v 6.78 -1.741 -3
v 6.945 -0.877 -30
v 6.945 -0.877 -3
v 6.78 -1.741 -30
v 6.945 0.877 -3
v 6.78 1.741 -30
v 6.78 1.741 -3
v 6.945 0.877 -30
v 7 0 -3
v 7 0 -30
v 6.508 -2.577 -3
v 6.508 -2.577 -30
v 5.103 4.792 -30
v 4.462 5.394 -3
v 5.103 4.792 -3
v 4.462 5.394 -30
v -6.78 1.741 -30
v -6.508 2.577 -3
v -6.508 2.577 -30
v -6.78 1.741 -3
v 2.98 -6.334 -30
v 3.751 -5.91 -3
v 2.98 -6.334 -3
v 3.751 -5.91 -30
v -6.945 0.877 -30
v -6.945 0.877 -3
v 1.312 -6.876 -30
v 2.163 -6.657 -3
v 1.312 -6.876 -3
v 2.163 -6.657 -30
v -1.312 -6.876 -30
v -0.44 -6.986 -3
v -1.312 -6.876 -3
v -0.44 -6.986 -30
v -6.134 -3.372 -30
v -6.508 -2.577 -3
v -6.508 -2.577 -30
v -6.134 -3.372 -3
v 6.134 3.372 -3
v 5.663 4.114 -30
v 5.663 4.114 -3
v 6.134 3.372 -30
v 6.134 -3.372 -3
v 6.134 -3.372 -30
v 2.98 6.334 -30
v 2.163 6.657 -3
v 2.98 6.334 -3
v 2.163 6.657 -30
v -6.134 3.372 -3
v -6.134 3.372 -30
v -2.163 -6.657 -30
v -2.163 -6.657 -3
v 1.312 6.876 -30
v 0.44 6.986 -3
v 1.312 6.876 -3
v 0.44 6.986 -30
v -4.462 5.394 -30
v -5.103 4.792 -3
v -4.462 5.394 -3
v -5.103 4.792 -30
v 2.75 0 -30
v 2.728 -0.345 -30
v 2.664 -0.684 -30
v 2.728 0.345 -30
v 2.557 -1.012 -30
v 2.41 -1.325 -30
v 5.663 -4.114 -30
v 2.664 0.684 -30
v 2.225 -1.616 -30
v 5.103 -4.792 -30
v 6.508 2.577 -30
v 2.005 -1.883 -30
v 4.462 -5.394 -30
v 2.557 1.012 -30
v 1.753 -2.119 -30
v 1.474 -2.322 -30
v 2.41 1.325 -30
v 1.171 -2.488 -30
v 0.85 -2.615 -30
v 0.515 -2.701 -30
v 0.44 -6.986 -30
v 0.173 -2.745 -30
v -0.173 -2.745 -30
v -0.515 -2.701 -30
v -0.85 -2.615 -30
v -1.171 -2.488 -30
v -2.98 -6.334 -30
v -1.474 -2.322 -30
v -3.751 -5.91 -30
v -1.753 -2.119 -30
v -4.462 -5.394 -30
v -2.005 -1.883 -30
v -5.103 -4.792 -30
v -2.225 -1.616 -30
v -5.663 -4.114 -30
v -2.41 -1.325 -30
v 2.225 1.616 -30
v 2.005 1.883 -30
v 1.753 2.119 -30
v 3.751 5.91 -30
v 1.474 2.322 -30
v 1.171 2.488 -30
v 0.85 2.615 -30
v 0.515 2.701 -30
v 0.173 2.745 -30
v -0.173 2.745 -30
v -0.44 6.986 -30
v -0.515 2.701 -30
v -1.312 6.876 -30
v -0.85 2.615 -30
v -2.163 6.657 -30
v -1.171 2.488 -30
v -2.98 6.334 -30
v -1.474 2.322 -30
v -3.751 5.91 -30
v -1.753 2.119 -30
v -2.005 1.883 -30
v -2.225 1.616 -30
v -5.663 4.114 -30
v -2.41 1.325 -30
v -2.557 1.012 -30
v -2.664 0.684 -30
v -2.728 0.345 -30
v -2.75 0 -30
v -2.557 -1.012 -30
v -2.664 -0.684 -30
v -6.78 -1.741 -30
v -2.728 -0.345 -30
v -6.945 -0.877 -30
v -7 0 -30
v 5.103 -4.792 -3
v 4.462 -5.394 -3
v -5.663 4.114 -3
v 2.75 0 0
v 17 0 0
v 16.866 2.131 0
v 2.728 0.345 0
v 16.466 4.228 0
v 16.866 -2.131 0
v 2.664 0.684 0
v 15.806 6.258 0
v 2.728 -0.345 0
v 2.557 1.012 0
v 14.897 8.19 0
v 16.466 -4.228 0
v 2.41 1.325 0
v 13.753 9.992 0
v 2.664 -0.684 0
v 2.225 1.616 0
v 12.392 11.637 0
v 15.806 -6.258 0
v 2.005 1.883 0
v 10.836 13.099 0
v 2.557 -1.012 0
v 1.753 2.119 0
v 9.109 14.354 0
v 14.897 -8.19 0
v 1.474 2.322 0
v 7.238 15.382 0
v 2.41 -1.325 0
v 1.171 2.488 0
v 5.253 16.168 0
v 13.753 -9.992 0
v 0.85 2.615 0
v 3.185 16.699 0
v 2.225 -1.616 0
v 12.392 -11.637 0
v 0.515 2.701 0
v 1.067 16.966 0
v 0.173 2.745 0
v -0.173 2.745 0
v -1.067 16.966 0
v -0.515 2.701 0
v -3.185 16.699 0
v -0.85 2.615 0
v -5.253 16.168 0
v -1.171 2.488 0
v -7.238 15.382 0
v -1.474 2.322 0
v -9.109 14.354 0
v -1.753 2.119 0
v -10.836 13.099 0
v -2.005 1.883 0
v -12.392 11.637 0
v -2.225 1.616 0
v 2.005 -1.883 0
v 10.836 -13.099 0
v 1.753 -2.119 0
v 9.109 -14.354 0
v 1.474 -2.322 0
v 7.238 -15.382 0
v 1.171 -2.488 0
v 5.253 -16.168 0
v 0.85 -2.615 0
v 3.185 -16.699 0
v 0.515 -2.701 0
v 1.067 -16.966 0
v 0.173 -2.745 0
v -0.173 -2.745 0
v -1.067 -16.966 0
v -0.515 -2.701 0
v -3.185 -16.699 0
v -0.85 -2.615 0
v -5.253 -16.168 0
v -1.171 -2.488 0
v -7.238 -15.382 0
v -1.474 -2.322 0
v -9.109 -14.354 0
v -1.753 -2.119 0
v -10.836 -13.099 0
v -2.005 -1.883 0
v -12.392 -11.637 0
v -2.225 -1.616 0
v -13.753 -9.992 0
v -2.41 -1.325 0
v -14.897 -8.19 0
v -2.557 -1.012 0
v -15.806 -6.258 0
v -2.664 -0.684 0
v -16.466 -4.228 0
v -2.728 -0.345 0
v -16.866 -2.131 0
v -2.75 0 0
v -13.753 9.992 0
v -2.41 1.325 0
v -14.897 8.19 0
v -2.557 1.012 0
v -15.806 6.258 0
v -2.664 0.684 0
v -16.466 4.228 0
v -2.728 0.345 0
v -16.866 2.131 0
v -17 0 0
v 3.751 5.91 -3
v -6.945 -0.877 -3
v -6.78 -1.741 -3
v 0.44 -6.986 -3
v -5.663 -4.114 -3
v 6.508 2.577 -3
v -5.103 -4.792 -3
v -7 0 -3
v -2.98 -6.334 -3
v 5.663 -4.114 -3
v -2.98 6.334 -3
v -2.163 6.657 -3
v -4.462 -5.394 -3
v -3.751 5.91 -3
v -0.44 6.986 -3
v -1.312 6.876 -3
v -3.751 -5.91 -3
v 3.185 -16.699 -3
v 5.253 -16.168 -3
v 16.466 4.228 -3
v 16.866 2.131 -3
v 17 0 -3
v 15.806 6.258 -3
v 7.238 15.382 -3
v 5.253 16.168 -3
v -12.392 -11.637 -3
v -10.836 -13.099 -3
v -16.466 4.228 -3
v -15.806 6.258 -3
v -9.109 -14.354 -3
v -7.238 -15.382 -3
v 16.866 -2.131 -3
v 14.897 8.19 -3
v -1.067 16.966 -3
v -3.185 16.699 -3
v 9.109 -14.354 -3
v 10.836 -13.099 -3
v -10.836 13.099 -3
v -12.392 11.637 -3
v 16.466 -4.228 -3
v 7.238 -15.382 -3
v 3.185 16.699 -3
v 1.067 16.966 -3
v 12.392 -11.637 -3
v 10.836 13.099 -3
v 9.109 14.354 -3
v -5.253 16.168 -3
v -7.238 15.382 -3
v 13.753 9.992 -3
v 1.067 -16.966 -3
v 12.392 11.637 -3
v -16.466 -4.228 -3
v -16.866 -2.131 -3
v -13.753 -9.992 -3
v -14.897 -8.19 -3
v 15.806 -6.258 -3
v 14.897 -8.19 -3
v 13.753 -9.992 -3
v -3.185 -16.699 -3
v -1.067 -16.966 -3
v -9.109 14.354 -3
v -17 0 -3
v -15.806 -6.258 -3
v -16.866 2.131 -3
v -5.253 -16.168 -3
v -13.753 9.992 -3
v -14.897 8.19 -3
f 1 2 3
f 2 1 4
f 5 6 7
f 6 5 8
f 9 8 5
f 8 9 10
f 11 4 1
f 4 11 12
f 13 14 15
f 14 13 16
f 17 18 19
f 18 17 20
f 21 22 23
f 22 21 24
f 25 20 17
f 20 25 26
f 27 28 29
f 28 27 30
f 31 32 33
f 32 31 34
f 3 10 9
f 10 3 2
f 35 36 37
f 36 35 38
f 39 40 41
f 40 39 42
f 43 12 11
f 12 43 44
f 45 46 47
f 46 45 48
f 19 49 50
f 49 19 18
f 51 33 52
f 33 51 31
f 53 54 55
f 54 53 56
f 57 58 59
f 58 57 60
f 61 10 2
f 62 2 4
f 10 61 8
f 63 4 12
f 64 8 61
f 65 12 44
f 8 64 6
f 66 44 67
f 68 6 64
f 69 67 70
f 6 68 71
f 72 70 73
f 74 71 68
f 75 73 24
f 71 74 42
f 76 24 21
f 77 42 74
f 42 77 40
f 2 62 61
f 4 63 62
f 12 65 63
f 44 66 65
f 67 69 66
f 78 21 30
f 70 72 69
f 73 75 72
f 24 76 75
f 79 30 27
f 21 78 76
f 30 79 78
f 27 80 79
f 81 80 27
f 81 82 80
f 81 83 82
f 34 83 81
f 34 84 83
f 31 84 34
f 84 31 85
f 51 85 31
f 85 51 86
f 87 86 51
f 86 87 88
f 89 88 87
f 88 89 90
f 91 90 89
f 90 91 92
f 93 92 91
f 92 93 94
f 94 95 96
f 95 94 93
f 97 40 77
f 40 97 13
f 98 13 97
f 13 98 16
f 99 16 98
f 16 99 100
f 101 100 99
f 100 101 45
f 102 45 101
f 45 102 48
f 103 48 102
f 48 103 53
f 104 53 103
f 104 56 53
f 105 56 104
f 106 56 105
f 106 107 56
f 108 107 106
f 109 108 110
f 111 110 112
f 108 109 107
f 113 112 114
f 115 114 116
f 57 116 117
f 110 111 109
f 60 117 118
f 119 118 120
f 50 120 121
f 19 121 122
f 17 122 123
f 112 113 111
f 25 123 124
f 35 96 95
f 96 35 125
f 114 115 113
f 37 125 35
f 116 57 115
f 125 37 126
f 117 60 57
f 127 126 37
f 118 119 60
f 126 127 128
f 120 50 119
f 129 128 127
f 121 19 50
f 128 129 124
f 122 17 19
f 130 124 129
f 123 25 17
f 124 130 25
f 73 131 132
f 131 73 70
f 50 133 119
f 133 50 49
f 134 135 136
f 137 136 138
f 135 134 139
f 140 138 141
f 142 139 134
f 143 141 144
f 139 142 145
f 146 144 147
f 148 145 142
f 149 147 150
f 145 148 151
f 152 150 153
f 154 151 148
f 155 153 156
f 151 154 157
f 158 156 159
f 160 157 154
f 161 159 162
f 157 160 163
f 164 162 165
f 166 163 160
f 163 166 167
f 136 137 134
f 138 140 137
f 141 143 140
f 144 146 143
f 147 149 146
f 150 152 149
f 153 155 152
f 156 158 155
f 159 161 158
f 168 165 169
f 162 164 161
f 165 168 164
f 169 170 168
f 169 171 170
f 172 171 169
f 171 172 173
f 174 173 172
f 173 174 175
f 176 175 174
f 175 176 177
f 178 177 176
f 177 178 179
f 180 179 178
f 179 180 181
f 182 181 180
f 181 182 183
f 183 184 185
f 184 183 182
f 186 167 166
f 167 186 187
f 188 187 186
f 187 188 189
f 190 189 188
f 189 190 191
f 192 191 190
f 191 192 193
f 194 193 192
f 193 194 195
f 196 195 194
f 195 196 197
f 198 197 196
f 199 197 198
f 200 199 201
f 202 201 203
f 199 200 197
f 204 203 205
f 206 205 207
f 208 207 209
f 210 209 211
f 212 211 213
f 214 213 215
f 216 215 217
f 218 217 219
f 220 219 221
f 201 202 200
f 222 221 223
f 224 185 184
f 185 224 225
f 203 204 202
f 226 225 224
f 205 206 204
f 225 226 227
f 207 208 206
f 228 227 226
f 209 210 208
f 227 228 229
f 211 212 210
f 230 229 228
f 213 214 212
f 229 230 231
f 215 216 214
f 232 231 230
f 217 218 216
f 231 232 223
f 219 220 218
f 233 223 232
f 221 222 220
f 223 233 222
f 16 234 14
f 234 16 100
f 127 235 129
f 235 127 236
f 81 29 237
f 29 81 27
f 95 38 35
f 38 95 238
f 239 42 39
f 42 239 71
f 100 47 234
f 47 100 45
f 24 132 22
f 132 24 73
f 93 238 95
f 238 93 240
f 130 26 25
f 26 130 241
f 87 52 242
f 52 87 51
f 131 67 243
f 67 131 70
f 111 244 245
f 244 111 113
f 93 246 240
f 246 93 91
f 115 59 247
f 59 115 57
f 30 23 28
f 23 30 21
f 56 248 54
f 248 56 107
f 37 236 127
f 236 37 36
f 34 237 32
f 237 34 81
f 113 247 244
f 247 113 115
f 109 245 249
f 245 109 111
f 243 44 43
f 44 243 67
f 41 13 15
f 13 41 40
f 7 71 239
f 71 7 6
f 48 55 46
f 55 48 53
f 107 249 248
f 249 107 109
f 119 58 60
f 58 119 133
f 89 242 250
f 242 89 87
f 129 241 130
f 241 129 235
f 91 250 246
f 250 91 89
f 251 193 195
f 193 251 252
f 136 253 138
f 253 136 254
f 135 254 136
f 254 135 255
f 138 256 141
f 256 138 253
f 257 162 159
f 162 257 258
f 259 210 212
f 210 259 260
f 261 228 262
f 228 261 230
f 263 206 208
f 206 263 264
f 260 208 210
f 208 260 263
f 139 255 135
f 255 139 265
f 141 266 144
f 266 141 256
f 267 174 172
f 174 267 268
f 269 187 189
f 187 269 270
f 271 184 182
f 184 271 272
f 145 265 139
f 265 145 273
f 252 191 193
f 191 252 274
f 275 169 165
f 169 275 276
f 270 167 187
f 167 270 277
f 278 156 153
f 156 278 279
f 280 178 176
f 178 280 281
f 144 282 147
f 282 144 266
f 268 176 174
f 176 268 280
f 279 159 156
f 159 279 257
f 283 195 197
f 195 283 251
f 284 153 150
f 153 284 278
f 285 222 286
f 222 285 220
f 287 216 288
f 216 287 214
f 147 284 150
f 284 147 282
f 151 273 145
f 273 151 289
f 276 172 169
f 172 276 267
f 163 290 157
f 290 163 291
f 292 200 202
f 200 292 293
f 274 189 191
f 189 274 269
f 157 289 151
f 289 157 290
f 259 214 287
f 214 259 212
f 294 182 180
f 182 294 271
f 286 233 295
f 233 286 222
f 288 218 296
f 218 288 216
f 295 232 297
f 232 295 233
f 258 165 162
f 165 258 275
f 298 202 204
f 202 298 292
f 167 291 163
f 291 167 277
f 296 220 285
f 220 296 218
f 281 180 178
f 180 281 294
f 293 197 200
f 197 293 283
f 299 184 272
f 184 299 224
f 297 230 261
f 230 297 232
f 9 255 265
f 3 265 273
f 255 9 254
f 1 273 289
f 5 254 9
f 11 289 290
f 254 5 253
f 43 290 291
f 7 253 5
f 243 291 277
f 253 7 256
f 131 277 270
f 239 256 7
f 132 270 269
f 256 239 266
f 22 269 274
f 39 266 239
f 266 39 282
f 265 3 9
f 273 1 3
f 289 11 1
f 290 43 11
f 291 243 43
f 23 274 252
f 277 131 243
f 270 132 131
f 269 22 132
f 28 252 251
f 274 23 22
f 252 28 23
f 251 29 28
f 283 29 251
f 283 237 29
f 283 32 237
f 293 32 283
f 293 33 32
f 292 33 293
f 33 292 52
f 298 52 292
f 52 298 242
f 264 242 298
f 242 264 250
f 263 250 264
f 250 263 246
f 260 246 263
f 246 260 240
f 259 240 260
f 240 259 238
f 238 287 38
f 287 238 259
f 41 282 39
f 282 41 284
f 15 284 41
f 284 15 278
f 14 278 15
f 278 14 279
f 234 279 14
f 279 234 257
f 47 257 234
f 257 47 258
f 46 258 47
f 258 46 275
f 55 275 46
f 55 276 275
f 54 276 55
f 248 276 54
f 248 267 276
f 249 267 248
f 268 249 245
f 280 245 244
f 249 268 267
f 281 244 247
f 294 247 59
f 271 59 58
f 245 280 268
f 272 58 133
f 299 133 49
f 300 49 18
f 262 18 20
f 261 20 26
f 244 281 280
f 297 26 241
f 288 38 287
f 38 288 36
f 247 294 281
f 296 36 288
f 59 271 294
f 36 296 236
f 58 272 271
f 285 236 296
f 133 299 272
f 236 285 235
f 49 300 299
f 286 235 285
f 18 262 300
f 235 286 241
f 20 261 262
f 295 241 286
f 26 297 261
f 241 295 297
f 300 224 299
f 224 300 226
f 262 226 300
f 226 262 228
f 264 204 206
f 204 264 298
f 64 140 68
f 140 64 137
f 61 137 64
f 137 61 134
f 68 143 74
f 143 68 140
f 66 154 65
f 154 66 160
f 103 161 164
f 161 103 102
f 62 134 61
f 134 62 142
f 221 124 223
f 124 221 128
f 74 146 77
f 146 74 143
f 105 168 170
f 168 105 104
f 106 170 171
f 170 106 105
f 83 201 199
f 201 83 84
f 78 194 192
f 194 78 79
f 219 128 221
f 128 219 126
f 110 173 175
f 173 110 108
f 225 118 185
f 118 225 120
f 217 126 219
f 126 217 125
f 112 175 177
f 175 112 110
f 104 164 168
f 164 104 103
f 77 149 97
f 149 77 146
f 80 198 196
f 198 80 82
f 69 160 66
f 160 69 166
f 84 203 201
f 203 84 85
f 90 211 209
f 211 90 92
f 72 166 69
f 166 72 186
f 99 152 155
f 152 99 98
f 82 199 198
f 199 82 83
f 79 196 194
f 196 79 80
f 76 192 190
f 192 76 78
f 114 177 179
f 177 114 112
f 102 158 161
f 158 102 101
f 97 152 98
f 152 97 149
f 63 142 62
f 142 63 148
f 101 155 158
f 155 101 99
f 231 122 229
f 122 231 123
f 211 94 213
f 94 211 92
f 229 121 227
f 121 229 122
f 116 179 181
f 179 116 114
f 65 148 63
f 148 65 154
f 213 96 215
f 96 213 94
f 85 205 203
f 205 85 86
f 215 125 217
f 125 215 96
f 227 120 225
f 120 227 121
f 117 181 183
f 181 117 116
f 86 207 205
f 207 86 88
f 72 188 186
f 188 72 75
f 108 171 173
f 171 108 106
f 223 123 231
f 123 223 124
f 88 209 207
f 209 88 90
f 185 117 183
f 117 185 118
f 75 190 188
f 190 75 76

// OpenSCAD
$fn = 50;


difference() {
	union() {
		translate(v = [0, 0, -30.0000000000]) {
			cylinder(h = 30, r = 7.0000000000);
		}
		translate(v = [0, 0, -3.0000000000]) {
			cylinder(h = 3, r = 17.0000000000);
		}
	}
	union() {
		#translate(v = [0, 0, -30]) {
			cylinder(h = 30, r = 2.7500000000);
		}
	}
}
